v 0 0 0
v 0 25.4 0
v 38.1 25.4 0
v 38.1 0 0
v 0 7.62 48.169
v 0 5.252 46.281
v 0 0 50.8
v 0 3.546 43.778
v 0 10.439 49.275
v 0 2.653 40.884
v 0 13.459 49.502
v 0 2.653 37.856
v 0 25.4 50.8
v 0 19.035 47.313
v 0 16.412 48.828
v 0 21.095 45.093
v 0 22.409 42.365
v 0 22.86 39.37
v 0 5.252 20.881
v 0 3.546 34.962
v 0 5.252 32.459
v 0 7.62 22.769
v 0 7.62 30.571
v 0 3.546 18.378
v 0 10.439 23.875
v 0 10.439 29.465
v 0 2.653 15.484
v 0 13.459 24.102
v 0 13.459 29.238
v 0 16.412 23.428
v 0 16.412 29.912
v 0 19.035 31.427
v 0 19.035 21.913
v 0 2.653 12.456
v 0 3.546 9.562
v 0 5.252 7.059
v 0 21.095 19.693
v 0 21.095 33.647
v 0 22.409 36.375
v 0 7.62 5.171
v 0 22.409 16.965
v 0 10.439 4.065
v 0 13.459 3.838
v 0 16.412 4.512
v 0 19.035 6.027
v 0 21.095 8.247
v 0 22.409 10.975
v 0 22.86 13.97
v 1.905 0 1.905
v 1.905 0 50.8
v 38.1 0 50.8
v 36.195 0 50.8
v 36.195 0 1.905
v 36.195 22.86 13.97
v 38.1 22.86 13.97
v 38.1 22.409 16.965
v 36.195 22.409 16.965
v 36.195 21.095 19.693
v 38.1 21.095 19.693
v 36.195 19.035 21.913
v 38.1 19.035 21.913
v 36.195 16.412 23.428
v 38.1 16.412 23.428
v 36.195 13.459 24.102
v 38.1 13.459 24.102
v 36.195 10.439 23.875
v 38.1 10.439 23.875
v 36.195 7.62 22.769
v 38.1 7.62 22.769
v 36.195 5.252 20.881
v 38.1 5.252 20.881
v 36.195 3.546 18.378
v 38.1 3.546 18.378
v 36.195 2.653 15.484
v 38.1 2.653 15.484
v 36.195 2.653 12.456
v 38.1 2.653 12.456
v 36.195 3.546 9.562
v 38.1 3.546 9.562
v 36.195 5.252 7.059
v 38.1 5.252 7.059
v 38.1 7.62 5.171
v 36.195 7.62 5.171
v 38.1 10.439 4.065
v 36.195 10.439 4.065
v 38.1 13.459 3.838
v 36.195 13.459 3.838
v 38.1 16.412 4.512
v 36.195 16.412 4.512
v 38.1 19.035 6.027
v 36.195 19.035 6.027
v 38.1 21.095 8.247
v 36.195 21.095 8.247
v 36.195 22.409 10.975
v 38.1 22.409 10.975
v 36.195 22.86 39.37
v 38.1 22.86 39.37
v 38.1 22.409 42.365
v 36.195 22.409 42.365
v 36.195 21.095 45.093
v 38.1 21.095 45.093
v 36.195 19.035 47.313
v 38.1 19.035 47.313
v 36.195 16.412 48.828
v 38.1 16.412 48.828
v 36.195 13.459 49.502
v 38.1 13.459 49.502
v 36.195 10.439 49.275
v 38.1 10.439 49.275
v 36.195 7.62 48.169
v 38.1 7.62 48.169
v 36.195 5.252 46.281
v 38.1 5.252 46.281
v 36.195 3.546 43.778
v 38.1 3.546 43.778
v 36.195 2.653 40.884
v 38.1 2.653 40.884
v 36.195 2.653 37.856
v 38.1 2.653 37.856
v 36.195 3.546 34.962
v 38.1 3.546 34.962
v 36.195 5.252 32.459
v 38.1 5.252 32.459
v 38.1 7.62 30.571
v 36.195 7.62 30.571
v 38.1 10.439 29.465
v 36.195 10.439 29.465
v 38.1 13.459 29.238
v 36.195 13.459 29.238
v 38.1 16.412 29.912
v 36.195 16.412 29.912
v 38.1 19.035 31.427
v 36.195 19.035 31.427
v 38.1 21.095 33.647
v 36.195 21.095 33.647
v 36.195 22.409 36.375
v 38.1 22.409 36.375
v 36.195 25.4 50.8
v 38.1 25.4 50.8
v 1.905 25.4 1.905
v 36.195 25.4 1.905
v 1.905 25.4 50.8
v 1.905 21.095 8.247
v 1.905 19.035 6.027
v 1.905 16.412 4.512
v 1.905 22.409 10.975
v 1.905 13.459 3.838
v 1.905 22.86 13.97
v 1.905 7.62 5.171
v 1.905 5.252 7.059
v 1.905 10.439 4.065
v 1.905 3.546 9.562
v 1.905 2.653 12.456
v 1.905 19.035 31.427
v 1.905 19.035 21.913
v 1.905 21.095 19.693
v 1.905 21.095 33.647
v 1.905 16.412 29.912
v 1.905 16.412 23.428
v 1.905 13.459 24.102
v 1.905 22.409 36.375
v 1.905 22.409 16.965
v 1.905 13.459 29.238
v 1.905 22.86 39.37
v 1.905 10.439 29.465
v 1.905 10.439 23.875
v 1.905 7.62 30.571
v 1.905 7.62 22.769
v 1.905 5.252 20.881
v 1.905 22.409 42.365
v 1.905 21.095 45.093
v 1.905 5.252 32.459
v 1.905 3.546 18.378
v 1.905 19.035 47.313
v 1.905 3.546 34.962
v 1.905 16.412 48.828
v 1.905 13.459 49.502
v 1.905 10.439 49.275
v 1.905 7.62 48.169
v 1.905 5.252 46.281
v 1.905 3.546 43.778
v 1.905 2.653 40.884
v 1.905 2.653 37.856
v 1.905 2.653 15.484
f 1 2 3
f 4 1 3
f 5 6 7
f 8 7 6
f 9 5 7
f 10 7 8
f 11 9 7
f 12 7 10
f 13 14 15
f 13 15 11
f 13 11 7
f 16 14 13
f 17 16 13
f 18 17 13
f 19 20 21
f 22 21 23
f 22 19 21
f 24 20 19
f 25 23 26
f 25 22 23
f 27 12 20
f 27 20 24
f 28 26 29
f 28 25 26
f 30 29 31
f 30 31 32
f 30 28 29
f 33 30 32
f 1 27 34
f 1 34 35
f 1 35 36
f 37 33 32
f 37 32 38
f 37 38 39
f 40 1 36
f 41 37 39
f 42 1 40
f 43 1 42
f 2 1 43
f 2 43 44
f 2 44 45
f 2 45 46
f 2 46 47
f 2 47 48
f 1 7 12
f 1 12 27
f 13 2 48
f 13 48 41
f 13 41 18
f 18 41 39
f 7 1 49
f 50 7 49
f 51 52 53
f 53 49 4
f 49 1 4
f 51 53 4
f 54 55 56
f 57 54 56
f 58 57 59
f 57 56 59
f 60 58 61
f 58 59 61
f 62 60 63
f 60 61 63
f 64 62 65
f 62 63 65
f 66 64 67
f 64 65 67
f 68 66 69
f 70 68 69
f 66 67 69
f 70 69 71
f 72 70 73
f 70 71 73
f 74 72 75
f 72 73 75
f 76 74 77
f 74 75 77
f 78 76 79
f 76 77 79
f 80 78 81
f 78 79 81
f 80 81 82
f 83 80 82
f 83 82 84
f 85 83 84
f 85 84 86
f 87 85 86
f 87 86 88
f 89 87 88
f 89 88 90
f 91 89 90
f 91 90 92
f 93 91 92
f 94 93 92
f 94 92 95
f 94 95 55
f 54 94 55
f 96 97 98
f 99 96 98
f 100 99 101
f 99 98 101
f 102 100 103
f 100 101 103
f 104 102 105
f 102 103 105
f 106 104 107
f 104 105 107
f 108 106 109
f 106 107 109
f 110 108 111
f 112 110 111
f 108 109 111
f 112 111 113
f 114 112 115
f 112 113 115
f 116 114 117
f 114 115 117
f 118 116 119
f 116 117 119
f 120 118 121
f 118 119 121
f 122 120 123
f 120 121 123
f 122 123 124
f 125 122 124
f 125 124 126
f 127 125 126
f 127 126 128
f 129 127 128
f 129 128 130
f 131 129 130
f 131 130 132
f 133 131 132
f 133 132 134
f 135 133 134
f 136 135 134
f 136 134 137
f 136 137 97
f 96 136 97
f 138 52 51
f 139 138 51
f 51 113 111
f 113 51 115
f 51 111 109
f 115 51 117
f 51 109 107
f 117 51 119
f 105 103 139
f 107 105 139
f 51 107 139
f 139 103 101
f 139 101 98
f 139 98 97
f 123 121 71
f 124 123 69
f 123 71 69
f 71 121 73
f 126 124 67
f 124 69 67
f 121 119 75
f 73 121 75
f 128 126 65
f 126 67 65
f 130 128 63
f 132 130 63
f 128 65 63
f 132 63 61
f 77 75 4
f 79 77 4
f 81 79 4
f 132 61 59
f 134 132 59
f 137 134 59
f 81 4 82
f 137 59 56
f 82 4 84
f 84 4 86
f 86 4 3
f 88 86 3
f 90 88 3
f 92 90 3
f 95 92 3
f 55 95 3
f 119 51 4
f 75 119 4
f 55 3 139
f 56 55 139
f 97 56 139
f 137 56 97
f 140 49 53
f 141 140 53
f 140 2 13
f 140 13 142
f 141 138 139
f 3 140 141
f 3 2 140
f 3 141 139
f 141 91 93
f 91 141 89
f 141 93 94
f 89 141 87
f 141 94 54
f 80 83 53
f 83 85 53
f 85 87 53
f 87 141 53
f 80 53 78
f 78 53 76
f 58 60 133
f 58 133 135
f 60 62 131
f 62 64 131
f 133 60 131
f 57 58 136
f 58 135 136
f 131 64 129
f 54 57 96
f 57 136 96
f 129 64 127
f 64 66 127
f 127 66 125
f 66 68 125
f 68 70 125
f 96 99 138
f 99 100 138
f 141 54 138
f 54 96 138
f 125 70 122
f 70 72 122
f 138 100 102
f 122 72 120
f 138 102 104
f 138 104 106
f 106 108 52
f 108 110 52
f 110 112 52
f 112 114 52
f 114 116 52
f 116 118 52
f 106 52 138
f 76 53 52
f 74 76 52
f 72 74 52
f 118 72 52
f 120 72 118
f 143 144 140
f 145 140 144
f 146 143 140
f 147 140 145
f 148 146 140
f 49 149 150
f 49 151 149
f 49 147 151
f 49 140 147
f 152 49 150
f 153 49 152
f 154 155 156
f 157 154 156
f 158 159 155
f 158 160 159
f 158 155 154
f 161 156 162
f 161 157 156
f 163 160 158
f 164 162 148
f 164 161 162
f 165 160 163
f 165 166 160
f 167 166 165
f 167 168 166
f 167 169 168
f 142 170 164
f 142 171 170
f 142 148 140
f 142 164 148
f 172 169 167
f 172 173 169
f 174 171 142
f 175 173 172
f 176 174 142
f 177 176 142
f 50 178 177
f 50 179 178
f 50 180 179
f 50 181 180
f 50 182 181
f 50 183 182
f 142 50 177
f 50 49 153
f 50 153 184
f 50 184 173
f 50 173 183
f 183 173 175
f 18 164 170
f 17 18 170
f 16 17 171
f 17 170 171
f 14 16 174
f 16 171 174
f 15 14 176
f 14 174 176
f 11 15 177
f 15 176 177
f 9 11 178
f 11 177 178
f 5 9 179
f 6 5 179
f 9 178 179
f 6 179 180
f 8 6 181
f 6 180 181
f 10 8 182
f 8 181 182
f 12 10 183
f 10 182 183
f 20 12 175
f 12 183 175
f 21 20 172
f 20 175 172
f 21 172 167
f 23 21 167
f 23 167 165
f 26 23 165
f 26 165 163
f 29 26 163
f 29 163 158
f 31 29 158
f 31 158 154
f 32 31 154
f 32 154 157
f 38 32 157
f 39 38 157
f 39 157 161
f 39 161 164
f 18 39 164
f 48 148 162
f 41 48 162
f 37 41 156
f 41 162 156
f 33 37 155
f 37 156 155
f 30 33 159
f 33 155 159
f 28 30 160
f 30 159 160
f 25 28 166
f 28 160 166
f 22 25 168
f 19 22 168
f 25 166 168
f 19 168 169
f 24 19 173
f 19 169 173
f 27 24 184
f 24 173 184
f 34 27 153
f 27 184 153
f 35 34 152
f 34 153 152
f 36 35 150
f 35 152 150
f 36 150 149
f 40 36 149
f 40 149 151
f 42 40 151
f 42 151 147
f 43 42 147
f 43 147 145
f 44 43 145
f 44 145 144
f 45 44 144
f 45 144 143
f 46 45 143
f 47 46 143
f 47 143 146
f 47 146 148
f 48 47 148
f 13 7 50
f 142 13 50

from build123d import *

# Parameters (mm, degrees)
F0_W     = 38.1
F0_H     = 25.4
F1_DEPTH = 50.8
F2_W     = 34.29
F2_H     = 48.895
F3_DEPTH = 25.4
F4_R     = 10.16
F5_DEPTH = 50.8


with BuildPart() as f1:
    # F0 (on Top) → F1 (new body)
    with BuildSketch(Plane.XY):
        with Locations((19.05, 12.7)):
            Rectangle(F0_W, F0_H)
    extrude(amount=F1_DEPTH)

    # F2 (on face) → F3 (cut)
    with BuildSketch(Plane.XZ):
        with Locations((19.05, 26.3525)):
            Rectangle(F2_W, F2_H)
    extrude(amount=-F3_DEPTH, mode=Mode.SUBTRACT)

    # F4 (on face) → F5 (cut)
    with BuildSketch(Plane.YZ.offset(38.1)):
        with Locations((12.7, 39.37)):
            Circle(F4_R)
        with Locations((12.7, 13.97)):
            Circle(F4_R)
    extrude(amount=-F5_DEPTH, mode=Mode.SUBTRACT)


solid = f1.part
